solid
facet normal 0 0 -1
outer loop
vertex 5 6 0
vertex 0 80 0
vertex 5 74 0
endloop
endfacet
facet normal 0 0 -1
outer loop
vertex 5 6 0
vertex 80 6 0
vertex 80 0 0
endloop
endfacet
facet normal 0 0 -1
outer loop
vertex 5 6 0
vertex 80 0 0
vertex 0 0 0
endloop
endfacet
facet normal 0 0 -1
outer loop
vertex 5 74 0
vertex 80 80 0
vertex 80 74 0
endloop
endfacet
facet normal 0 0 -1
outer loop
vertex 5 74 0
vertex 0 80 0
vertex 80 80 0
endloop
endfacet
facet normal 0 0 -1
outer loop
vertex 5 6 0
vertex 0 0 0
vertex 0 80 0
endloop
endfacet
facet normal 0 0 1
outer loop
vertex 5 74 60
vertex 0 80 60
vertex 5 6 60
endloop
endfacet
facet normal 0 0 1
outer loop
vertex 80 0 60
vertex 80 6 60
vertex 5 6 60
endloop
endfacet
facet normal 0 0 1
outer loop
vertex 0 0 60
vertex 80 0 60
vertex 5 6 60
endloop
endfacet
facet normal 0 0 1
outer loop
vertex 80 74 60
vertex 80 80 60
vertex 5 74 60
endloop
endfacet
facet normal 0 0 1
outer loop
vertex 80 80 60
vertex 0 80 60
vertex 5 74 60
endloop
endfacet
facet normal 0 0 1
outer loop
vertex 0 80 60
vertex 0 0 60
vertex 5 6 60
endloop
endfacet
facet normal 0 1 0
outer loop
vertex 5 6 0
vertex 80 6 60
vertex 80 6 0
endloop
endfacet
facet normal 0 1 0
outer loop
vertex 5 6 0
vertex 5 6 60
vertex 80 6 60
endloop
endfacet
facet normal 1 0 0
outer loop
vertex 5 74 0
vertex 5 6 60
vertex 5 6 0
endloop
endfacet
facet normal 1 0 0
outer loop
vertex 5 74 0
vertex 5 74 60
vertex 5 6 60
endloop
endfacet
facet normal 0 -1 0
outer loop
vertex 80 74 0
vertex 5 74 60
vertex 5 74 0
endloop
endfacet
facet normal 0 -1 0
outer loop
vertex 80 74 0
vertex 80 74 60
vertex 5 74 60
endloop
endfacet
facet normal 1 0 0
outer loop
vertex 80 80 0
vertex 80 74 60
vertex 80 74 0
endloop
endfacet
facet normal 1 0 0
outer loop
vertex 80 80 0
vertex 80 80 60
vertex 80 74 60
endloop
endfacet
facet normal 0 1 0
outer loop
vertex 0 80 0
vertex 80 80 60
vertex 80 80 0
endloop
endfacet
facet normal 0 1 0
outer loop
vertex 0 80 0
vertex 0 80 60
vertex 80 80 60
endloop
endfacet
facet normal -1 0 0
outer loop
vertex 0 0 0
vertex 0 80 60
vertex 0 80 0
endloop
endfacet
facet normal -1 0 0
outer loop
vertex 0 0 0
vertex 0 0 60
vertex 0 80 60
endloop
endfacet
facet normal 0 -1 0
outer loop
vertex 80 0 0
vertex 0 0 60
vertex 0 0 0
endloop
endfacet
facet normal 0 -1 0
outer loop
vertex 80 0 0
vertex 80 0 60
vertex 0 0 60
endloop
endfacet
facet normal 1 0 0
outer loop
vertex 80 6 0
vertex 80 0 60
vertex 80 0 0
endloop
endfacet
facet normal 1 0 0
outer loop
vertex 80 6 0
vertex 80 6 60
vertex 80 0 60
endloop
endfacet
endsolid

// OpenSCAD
$fn = 32;

// ----------------------------------------------------------------------
// Structural section: channel 80 x 80 mm
// ----------------------------------------------------------------------

// --- parameters (mm) ---
sec_w = 80;               // channel width, X
sec_h = 80;               // channel height, Y
flange_t = 6;             // flange thickness
web_t = 5;                // web thickness
plate_t = 60;             // cut length, Z (extrusion height)

profile = [[0, 0], [80, 0], [80, 6], [5, 6], [5, 74], [80, 74], [80, 80], [0, 80]];  // primary outline, 8 points, counter clockwise

// --- the one profile operation ---
linear_extrude(height = plate_t) polygon(points = profile);
